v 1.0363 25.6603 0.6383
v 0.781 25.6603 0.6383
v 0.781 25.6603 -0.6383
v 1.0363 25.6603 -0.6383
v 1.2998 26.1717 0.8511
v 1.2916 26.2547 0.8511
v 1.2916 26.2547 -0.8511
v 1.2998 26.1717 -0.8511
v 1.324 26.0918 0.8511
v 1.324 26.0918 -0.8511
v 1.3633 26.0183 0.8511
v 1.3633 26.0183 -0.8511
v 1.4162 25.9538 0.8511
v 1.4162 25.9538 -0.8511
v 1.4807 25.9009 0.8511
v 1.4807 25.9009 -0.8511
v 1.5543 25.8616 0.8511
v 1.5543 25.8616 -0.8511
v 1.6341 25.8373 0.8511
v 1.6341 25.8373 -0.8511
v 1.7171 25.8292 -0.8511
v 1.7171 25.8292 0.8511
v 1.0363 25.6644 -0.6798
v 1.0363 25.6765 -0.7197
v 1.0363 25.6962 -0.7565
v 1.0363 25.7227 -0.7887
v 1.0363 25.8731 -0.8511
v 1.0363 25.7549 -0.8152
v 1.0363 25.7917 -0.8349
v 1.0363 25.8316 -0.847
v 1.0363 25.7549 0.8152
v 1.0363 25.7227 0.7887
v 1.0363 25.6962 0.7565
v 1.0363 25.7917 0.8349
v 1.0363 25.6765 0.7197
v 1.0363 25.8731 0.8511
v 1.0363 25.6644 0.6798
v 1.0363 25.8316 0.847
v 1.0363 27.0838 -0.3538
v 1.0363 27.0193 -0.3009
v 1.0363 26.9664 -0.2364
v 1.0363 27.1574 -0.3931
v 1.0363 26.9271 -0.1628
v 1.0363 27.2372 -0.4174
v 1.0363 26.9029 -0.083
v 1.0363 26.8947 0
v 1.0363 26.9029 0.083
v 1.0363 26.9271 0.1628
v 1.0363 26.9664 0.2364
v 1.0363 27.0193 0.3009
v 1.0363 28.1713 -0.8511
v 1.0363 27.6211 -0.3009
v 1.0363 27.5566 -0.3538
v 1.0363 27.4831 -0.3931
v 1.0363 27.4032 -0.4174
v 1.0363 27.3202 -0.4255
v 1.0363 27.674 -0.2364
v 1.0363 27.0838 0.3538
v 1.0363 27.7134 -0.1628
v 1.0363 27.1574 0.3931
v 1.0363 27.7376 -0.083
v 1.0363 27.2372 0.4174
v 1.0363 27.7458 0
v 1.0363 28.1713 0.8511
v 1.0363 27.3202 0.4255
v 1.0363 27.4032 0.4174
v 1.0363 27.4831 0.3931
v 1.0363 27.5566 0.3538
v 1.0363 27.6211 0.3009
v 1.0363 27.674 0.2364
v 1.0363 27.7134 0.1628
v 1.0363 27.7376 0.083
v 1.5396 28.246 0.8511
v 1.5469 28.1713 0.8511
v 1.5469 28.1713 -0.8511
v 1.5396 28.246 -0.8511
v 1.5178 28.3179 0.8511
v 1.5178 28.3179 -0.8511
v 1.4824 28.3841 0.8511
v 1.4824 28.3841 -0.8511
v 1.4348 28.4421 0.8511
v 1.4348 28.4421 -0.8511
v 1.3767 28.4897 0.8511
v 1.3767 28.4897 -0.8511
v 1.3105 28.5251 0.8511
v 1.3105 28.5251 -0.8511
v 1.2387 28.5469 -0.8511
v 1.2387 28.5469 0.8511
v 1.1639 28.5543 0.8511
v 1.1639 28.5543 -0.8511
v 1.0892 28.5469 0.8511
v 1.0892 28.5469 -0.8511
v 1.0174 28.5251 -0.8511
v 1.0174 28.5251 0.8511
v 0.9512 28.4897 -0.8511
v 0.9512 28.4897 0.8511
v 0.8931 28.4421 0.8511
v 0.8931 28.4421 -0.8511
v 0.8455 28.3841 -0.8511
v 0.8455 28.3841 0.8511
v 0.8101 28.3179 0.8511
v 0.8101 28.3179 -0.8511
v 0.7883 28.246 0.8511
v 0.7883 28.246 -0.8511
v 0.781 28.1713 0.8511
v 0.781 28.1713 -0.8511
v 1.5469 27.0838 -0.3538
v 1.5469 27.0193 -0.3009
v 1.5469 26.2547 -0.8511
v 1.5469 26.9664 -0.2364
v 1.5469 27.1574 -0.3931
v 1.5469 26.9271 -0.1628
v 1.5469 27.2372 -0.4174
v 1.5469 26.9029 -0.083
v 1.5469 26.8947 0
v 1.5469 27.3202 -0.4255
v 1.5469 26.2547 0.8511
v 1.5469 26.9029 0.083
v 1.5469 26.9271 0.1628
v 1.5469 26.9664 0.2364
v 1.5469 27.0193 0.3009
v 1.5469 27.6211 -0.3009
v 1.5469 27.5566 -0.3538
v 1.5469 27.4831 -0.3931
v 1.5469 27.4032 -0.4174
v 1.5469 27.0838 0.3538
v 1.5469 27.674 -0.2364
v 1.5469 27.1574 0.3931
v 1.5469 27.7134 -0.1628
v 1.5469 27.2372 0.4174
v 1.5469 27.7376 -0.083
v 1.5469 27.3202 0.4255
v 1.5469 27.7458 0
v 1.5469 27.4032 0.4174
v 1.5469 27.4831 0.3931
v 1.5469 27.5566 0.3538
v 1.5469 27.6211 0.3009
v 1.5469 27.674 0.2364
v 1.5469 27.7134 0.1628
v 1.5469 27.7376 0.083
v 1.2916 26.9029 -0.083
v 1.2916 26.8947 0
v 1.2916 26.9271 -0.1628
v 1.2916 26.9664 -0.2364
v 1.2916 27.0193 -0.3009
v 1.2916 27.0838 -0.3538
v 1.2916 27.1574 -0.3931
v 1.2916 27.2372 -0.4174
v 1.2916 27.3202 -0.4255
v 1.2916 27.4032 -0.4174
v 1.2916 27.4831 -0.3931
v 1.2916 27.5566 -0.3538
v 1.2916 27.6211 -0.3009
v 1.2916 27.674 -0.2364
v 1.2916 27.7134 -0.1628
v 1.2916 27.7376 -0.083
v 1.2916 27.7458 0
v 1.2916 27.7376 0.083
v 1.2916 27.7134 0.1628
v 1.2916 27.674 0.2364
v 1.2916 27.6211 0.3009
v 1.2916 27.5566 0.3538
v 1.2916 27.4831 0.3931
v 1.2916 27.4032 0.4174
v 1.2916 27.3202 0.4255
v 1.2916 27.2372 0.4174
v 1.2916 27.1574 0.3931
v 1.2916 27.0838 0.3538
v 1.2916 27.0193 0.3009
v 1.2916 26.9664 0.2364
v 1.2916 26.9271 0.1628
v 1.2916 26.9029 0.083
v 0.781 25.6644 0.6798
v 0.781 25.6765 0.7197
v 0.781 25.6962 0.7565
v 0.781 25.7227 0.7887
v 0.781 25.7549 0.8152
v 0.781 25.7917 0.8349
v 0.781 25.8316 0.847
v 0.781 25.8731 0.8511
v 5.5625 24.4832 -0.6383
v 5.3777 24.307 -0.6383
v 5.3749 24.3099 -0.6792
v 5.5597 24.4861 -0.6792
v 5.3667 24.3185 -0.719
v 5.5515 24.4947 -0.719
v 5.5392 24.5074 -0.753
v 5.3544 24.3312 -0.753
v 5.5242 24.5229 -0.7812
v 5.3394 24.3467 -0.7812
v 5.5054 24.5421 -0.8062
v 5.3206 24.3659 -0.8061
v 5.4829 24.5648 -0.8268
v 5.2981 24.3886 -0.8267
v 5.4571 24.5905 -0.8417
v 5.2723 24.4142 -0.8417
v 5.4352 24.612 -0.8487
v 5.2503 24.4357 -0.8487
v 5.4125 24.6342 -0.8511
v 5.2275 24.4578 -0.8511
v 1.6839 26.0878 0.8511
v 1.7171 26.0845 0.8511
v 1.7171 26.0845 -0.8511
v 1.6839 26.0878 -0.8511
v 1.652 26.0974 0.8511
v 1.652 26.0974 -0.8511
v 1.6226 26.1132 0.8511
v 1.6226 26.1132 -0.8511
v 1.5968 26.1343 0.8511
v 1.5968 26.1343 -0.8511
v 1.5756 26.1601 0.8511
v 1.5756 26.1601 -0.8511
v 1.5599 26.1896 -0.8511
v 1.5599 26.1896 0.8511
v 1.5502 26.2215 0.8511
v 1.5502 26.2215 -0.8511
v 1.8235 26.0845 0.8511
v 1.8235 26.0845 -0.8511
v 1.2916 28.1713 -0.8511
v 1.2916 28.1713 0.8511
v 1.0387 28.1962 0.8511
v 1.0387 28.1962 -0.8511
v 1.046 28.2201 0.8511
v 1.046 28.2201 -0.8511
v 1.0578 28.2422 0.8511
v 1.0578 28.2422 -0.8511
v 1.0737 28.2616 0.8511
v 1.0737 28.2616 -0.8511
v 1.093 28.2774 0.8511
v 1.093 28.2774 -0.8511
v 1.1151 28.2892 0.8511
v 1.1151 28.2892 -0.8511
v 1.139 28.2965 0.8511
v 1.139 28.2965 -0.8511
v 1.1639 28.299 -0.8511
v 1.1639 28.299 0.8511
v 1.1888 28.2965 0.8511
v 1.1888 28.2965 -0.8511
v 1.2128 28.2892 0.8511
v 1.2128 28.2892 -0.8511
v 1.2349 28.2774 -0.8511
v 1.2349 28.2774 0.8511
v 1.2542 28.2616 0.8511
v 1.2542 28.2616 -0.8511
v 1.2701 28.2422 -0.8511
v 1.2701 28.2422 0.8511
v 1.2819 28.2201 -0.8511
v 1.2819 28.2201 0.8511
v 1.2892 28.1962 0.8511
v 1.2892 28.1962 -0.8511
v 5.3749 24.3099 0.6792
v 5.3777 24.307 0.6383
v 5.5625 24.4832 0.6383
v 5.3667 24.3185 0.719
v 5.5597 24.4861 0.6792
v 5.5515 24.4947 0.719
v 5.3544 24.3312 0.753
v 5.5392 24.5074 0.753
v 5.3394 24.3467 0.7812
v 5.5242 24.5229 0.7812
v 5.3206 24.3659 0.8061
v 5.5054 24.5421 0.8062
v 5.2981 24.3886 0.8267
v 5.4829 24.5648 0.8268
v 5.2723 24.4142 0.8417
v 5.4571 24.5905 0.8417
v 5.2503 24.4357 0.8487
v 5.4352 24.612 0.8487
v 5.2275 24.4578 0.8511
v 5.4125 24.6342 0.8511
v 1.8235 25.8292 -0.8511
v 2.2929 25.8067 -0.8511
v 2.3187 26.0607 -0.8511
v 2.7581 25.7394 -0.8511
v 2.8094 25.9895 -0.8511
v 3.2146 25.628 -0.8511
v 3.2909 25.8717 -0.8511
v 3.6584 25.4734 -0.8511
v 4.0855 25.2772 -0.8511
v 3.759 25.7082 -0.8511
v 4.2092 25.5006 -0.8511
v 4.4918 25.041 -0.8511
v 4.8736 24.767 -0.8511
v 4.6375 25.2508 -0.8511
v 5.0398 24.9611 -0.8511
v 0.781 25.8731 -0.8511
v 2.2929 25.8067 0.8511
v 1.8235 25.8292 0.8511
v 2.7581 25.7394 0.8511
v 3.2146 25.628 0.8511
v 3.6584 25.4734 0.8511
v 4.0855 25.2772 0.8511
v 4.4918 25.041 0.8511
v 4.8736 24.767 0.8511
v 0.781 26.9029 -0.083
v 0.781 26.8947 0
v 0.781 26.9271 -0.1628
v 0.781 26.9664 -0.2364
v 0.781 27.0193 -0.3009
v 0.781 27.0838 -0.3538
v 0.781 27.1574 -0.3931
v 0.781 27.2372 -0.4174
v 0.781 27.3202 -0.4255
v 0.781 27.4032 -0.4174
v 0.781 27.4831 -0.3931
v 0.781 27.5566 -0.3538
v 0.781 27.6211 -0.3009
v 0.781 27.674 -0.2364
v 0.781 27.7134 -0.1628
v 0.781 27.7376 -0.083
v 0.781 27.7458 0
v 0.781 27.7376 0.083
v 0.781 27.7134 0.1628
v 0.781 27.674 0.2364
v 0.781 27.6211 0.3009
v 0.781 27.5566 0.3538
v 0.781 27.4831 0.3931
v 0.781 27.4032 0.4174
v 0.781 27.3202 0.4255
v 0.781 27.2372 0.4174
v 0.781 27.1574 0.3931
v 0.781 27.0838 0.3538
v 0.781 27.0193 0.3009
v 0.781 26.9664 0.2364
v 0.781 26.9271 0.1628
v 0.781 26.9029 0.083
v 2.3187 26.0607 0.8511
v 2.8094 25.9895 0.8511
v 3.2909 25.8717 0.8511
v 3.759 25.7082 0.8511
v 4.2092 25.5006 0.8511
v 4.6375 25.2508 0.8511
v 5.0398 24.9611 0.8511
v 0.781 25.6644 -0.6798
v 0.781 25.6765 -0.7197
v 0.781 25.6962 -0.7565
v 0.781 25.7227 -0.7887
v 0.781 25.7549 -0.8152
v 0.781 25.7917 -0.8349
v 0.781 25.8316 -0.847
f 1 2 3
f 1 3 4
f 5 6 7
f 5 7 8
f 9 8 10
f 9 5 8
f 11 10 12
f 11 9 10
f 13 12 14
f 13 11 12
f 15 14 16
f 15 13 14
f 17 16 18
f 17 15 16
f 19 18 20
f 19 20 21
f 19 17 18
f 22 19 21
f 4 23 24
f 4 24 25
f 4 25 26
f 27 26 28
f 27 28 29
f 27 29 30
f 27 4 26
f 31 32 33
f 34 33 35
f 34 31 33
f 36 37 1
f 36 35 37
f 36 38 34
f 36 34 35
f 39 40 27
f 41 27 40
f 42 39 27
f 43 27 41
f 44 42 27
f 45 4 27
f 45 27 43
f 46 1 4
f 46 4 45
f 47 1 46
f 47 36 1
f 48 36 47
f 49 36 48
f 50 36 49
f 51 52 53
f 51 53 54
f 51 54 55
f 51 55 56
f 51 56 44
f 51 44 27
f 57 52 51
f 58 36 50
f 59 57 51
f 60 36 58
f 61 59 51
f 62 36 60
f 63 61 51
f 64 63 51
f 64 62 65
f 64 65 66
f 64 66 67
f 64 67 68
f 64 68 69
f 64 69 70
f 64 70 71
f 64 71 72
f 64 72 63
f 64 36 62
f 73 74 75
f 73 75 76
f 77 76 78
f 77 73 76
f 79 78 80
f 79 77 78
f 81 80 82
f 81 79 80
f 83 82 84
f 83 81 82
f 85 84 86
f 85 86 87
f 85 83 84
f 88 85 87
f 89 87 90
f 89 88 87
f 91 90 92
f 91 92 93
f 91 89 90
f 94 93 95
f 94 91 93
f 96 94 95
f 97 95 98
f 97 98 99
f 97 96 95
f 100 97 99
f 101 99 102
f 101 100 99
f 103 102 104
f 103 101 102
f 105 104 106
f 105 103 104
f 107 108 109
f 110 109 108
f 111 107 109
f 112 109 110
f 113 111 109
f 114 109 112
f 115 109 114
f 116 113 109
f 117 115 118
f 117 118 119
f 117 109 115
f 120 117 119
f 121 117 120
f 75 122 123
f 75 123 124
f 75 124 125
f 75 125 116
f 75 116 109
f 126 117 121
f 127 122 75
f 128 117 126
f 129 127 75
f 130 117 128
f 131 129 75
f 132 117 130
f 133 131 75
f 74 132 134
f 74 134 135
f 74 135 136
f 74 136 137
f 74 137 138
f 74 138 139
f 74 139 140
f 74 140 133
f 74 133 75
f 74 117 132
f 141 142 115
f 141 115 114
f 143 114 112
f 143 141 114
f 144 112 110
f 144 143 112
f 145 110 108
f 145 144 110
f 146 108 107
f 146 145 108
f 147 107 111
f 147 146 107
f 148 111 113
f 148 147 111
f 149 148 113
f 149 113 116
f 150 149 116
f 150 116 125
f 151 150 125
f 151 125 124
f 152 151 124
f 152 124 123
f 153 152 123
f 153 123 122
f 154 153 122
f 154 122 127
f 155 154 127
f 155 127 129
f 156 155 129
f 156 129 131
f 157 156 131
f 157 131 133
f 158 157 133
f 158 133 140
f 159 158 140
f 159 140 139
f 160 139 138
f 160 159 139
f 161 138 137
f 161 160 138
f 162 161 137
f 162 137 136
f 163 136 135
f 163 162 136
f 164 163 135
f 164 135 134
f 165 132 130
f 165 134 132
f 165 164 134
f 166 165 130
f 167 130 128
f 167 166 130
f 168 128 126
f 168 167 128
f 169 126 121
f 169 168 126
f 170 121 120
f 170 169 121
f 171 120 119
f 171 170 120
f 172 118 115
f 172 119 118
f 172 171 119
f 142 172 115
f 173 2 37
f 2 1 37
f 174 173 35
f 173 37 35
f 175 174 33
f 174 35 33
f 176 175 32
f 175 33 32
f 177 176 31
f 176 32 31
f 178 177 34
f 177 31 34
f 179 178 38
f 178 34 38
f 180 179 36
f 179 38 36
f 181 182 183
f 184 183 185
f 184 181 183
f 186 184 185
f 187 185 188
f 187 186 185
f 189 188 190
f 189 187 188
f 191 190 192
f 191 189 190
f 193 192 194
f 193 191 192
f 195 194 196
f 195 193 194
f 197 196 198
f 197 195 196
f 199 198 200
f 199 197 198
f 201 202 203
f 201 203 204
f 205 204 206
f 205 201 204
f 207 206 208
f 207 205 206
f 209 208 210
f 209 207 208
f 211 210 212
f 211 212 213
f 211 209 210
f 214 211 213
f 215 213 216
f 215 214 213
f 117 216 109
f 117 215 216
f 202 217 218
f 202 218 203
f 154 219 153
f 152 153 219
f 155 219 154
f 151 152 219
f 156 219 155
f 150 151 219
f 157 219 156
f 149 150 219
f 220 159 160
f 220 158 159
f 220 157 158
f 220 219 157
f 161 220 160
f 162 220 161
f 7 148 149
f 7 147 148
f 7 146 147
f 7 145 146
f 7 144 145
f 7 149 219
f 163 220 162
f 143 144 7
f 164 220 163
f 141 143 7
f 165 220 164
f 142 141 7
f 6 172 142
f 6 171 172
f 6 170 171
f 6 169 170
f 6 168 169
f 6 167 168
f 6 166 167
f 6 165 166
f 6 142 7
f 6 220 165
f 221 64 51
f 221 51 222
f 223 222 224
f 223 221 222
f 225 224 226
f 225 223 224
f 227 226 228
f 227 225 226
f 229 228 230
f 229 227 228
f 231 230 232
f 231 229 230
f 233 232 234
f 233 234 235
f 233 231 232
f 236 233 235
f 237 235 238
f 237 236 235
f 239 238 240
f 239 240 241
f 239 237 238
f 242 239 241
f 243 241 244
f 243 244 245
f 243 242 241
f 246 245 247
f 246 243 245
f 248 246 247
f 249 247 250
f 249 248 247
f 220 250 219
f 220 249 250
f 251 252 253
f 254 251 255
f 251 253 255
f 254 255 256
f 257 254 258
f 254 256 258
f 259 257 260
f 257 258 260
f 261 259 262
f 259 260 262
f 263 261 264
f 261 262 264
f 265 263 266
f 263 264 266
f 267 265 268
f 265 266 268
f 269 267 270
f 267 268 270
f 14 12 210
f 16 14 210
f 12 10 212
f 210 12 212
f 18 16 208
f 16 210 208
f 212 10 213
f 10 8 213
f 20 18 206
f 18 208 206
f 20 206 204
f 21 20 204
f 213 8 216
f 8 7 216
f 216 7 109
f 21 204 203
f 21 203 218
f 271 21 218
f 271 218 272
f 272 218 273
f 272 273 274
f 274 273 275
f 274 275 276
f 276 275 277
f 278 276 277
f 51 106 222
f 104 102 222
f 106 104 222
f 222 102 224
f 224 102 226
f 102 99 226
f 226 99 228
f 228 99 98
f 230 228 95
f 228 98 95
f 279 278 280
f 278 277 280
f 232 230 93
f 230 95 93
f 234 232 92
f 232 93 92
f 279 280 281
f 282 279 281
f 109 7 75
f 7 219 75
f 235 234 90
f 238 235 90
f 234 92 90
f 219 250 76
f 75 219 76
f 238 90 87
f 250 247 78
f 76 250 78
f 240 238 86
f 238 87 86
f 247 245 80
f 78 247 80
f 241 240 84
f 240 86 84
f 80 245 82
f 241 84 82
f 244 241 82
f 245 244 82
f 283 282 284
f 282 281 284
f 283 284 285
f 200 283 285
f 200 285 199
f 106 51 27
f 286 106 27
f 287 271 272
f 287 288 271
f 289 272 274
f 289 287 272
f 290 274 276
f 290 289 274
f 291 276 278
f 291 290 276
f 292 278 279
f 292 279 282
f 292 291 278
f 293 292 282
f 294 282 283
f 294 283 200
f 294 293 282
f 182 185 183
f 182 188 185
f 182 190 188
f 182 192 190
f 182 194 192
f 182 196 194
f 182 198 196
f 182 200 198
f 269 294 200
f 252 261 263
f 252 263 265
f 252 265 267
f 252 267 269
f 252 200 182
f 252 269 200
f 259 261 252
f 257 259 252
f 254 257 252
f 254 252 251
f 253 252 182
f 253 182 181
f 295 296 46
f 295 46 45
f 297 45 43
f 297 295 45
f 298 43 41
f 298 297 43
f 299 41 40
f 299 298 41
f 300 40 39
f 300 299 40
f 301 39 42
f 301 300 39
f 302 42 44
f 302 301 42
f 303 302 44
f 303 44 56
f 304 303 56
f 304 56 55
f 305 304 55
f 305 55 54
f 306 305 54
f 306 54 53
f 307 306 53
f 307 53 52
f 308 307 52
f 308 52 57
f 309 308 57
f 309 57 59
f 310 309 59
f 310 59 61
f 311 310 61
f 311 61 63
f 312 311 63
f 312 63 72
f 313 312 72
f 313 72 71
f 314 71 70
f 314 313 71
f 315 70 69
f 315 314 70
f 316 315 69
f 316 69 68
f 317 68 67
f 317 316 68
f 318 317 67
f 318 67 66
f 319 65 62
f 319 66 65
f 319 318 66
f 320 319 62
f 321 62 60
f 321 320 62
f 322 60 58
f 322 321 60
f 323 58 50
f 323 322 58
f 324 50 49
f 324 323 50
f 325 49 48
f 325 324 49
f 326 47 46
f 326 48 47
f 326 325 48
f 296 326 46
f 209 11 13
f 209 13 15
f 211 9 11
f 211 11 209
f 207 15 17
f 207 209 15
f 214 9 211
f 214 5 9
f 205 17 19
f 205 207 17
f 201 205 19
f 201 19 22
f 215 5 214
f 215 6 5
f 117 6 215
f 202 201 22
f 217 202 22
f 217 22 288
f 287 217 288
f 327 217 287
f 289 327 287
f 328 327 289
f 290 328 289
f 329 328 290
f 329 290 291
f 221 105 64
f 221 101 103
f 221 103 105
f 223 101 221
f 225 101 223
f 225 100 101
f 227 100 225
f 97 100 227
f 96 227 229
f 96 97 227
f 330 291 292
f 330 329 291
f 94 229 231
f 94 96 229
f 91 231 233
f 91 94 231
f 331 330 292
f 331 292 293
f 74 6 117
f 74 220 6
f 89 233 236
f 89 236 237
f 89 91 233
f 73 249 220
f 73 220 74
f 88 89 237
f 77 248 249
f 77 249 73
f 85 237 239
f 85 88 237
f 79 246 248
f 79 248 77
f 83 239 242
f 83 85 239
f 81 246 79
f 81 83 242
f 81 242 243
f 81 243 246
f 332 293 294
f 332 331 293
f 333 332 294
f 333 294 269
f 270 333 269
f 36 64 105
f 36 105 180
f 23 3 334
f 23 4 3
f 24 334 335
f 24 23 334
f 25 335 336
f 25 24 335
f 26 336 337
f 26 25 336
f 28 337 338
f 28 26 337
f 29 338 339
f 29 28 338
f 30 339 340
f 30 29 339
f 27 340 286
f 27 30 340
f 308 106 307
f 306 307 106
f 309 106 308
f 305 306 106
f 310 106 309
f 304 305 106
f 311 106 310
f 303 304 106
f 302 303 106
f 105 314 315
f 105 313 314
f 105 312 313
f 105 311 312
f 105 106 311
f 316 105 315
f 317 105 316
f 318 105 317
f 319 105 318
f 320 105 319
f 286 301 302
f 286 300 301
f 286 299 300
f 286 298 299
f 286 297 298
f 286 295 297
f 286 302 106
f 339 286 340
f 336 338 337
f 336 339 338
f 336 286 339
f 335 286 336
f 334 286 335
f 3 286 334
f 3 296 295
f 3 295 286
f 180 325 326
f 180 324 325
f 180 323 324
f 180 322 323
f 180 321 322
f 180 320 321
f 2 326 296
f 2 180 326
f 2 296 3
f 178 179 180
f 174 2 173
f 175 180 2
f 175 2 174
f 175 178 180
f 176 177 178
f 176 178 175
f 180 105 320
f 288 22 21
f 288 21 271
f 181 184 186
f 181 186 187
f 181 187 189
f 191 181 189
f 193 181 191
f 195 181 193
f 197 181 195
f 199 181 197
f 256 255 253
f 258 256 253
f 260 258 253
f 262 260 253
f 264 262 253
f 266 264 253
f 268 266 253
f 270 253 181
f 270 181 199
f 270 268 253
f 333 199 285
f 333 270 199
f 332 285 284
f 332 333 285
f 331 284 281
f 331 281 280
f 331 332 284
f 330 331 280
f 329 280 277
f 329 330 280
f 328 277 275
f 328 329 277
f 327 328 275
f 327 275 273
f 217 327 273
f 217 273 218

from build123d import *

# Parameters (mm, degrees)
BASE_FLANGE3_DEPTH      = 4
FILLET3_R               = 1
CUT_EXTRUDE2_DEPTH      = 41.856527321
CUT_EXTRUDE2_DEPTH_BACK = 41.856527321
SKETCH9_R               = 2
ECHELLE2_SCALE          = 0.212765957


# Sheet-metal steps are written as plain solids
with BuildPart() as part:
    # Sketch7 → Base-Flange3 (new, symmetric)
    with BuildSketch(Plane.XY):
        with BuildLine():
            Line((-3.7, 23.065125189), (-3.7, 34.866642891))
            ThreePointArc((-3.7, 34.866642891), (-3.1, 35.466642891), (-2.5, 34.866642891))
            Line((-2.5, 34.866642891), (-2.5, 25.858610285))
            ThreePointArc((-2.5, 25.858610285), (-1.914213562, 24.444396722), (-0.5, 23.858610285))
            Line((-0.5, 23.858610285), (0, 23.858610285))
            ThreePointArc((0, 23.858610285), (9.086009171, 21.994836321), (16.704533318, 16.704533318))
            Line((16.704533318, 16.704533318), (17.573079397, 17.532559712))
            ThreePointArc((17.573079397, 17.532559712), (9.558432883, 23.097930078), (0, 25.058610285))
            Line((0, 25.058610285), (-0.5, 25.058610285))
            ThreePointArc((-0.5, 25.058610285), (-1.065685425, 25.29292486), (-1.3, 25.858610285))
            Line((-1.3, 25.858610285), (-1.3, 34.866642891))
            ThreePointArc((-1.3, 34.866642891), (-3.1, 36.666642891), (-4.9, 34.866642891))
            Line((-4.9, 34.866642891), (-4.9, 23.065125189))
            Line((-4.9, 23.065125189), (-3.7, 23.065125189))
        make_face()
    extrude(amount=BASE_FLANGE3_DEPTH, both=True)

    # Fillet3
    fillet3_edges = [part.edges().sort_by_distance(p)[0] for p in [
        (17.138806358, 17.118546515, -4),
        (-4.3, 23.065125189, -4),
        (17.138806358, 17.118546515, 4),
        (-4.3, 23.065125189, 4),
    ]]
    fillet(fillet3_edges, radius=FILLET3_R)

    # Sketch9 → Cut-Extrude2 (cut, two sides: drawn at the far end of the back side and taken through both)
    with BuildSketch(Plane(origin=(0, 0, 0), x_dir=(0, 0, -1), z_dir=(1, 0, 0)).offset(-CUT_EXTRUDE2_DEPTH_BACK)):
        with Locations(Location((0, 30.866642891, 0), (0, 0, 270))):
            Circle(SKETCH9_R)
    extrude(amount=CUT_EXTRUDE2_DEPTH + CUT_EXTRUDE2_DEPTH_BACK, mode=Mode.SUBTRACT)


with BuildPart() as part_1:
    # Echelle2: scaled about (2.31636153, 26.36174226, 0)
    add(part.part.scale(ECHELLE2_SCALE).moved(Location((1.823518651, 20.752860928, 0))))


solid = part_1.part
